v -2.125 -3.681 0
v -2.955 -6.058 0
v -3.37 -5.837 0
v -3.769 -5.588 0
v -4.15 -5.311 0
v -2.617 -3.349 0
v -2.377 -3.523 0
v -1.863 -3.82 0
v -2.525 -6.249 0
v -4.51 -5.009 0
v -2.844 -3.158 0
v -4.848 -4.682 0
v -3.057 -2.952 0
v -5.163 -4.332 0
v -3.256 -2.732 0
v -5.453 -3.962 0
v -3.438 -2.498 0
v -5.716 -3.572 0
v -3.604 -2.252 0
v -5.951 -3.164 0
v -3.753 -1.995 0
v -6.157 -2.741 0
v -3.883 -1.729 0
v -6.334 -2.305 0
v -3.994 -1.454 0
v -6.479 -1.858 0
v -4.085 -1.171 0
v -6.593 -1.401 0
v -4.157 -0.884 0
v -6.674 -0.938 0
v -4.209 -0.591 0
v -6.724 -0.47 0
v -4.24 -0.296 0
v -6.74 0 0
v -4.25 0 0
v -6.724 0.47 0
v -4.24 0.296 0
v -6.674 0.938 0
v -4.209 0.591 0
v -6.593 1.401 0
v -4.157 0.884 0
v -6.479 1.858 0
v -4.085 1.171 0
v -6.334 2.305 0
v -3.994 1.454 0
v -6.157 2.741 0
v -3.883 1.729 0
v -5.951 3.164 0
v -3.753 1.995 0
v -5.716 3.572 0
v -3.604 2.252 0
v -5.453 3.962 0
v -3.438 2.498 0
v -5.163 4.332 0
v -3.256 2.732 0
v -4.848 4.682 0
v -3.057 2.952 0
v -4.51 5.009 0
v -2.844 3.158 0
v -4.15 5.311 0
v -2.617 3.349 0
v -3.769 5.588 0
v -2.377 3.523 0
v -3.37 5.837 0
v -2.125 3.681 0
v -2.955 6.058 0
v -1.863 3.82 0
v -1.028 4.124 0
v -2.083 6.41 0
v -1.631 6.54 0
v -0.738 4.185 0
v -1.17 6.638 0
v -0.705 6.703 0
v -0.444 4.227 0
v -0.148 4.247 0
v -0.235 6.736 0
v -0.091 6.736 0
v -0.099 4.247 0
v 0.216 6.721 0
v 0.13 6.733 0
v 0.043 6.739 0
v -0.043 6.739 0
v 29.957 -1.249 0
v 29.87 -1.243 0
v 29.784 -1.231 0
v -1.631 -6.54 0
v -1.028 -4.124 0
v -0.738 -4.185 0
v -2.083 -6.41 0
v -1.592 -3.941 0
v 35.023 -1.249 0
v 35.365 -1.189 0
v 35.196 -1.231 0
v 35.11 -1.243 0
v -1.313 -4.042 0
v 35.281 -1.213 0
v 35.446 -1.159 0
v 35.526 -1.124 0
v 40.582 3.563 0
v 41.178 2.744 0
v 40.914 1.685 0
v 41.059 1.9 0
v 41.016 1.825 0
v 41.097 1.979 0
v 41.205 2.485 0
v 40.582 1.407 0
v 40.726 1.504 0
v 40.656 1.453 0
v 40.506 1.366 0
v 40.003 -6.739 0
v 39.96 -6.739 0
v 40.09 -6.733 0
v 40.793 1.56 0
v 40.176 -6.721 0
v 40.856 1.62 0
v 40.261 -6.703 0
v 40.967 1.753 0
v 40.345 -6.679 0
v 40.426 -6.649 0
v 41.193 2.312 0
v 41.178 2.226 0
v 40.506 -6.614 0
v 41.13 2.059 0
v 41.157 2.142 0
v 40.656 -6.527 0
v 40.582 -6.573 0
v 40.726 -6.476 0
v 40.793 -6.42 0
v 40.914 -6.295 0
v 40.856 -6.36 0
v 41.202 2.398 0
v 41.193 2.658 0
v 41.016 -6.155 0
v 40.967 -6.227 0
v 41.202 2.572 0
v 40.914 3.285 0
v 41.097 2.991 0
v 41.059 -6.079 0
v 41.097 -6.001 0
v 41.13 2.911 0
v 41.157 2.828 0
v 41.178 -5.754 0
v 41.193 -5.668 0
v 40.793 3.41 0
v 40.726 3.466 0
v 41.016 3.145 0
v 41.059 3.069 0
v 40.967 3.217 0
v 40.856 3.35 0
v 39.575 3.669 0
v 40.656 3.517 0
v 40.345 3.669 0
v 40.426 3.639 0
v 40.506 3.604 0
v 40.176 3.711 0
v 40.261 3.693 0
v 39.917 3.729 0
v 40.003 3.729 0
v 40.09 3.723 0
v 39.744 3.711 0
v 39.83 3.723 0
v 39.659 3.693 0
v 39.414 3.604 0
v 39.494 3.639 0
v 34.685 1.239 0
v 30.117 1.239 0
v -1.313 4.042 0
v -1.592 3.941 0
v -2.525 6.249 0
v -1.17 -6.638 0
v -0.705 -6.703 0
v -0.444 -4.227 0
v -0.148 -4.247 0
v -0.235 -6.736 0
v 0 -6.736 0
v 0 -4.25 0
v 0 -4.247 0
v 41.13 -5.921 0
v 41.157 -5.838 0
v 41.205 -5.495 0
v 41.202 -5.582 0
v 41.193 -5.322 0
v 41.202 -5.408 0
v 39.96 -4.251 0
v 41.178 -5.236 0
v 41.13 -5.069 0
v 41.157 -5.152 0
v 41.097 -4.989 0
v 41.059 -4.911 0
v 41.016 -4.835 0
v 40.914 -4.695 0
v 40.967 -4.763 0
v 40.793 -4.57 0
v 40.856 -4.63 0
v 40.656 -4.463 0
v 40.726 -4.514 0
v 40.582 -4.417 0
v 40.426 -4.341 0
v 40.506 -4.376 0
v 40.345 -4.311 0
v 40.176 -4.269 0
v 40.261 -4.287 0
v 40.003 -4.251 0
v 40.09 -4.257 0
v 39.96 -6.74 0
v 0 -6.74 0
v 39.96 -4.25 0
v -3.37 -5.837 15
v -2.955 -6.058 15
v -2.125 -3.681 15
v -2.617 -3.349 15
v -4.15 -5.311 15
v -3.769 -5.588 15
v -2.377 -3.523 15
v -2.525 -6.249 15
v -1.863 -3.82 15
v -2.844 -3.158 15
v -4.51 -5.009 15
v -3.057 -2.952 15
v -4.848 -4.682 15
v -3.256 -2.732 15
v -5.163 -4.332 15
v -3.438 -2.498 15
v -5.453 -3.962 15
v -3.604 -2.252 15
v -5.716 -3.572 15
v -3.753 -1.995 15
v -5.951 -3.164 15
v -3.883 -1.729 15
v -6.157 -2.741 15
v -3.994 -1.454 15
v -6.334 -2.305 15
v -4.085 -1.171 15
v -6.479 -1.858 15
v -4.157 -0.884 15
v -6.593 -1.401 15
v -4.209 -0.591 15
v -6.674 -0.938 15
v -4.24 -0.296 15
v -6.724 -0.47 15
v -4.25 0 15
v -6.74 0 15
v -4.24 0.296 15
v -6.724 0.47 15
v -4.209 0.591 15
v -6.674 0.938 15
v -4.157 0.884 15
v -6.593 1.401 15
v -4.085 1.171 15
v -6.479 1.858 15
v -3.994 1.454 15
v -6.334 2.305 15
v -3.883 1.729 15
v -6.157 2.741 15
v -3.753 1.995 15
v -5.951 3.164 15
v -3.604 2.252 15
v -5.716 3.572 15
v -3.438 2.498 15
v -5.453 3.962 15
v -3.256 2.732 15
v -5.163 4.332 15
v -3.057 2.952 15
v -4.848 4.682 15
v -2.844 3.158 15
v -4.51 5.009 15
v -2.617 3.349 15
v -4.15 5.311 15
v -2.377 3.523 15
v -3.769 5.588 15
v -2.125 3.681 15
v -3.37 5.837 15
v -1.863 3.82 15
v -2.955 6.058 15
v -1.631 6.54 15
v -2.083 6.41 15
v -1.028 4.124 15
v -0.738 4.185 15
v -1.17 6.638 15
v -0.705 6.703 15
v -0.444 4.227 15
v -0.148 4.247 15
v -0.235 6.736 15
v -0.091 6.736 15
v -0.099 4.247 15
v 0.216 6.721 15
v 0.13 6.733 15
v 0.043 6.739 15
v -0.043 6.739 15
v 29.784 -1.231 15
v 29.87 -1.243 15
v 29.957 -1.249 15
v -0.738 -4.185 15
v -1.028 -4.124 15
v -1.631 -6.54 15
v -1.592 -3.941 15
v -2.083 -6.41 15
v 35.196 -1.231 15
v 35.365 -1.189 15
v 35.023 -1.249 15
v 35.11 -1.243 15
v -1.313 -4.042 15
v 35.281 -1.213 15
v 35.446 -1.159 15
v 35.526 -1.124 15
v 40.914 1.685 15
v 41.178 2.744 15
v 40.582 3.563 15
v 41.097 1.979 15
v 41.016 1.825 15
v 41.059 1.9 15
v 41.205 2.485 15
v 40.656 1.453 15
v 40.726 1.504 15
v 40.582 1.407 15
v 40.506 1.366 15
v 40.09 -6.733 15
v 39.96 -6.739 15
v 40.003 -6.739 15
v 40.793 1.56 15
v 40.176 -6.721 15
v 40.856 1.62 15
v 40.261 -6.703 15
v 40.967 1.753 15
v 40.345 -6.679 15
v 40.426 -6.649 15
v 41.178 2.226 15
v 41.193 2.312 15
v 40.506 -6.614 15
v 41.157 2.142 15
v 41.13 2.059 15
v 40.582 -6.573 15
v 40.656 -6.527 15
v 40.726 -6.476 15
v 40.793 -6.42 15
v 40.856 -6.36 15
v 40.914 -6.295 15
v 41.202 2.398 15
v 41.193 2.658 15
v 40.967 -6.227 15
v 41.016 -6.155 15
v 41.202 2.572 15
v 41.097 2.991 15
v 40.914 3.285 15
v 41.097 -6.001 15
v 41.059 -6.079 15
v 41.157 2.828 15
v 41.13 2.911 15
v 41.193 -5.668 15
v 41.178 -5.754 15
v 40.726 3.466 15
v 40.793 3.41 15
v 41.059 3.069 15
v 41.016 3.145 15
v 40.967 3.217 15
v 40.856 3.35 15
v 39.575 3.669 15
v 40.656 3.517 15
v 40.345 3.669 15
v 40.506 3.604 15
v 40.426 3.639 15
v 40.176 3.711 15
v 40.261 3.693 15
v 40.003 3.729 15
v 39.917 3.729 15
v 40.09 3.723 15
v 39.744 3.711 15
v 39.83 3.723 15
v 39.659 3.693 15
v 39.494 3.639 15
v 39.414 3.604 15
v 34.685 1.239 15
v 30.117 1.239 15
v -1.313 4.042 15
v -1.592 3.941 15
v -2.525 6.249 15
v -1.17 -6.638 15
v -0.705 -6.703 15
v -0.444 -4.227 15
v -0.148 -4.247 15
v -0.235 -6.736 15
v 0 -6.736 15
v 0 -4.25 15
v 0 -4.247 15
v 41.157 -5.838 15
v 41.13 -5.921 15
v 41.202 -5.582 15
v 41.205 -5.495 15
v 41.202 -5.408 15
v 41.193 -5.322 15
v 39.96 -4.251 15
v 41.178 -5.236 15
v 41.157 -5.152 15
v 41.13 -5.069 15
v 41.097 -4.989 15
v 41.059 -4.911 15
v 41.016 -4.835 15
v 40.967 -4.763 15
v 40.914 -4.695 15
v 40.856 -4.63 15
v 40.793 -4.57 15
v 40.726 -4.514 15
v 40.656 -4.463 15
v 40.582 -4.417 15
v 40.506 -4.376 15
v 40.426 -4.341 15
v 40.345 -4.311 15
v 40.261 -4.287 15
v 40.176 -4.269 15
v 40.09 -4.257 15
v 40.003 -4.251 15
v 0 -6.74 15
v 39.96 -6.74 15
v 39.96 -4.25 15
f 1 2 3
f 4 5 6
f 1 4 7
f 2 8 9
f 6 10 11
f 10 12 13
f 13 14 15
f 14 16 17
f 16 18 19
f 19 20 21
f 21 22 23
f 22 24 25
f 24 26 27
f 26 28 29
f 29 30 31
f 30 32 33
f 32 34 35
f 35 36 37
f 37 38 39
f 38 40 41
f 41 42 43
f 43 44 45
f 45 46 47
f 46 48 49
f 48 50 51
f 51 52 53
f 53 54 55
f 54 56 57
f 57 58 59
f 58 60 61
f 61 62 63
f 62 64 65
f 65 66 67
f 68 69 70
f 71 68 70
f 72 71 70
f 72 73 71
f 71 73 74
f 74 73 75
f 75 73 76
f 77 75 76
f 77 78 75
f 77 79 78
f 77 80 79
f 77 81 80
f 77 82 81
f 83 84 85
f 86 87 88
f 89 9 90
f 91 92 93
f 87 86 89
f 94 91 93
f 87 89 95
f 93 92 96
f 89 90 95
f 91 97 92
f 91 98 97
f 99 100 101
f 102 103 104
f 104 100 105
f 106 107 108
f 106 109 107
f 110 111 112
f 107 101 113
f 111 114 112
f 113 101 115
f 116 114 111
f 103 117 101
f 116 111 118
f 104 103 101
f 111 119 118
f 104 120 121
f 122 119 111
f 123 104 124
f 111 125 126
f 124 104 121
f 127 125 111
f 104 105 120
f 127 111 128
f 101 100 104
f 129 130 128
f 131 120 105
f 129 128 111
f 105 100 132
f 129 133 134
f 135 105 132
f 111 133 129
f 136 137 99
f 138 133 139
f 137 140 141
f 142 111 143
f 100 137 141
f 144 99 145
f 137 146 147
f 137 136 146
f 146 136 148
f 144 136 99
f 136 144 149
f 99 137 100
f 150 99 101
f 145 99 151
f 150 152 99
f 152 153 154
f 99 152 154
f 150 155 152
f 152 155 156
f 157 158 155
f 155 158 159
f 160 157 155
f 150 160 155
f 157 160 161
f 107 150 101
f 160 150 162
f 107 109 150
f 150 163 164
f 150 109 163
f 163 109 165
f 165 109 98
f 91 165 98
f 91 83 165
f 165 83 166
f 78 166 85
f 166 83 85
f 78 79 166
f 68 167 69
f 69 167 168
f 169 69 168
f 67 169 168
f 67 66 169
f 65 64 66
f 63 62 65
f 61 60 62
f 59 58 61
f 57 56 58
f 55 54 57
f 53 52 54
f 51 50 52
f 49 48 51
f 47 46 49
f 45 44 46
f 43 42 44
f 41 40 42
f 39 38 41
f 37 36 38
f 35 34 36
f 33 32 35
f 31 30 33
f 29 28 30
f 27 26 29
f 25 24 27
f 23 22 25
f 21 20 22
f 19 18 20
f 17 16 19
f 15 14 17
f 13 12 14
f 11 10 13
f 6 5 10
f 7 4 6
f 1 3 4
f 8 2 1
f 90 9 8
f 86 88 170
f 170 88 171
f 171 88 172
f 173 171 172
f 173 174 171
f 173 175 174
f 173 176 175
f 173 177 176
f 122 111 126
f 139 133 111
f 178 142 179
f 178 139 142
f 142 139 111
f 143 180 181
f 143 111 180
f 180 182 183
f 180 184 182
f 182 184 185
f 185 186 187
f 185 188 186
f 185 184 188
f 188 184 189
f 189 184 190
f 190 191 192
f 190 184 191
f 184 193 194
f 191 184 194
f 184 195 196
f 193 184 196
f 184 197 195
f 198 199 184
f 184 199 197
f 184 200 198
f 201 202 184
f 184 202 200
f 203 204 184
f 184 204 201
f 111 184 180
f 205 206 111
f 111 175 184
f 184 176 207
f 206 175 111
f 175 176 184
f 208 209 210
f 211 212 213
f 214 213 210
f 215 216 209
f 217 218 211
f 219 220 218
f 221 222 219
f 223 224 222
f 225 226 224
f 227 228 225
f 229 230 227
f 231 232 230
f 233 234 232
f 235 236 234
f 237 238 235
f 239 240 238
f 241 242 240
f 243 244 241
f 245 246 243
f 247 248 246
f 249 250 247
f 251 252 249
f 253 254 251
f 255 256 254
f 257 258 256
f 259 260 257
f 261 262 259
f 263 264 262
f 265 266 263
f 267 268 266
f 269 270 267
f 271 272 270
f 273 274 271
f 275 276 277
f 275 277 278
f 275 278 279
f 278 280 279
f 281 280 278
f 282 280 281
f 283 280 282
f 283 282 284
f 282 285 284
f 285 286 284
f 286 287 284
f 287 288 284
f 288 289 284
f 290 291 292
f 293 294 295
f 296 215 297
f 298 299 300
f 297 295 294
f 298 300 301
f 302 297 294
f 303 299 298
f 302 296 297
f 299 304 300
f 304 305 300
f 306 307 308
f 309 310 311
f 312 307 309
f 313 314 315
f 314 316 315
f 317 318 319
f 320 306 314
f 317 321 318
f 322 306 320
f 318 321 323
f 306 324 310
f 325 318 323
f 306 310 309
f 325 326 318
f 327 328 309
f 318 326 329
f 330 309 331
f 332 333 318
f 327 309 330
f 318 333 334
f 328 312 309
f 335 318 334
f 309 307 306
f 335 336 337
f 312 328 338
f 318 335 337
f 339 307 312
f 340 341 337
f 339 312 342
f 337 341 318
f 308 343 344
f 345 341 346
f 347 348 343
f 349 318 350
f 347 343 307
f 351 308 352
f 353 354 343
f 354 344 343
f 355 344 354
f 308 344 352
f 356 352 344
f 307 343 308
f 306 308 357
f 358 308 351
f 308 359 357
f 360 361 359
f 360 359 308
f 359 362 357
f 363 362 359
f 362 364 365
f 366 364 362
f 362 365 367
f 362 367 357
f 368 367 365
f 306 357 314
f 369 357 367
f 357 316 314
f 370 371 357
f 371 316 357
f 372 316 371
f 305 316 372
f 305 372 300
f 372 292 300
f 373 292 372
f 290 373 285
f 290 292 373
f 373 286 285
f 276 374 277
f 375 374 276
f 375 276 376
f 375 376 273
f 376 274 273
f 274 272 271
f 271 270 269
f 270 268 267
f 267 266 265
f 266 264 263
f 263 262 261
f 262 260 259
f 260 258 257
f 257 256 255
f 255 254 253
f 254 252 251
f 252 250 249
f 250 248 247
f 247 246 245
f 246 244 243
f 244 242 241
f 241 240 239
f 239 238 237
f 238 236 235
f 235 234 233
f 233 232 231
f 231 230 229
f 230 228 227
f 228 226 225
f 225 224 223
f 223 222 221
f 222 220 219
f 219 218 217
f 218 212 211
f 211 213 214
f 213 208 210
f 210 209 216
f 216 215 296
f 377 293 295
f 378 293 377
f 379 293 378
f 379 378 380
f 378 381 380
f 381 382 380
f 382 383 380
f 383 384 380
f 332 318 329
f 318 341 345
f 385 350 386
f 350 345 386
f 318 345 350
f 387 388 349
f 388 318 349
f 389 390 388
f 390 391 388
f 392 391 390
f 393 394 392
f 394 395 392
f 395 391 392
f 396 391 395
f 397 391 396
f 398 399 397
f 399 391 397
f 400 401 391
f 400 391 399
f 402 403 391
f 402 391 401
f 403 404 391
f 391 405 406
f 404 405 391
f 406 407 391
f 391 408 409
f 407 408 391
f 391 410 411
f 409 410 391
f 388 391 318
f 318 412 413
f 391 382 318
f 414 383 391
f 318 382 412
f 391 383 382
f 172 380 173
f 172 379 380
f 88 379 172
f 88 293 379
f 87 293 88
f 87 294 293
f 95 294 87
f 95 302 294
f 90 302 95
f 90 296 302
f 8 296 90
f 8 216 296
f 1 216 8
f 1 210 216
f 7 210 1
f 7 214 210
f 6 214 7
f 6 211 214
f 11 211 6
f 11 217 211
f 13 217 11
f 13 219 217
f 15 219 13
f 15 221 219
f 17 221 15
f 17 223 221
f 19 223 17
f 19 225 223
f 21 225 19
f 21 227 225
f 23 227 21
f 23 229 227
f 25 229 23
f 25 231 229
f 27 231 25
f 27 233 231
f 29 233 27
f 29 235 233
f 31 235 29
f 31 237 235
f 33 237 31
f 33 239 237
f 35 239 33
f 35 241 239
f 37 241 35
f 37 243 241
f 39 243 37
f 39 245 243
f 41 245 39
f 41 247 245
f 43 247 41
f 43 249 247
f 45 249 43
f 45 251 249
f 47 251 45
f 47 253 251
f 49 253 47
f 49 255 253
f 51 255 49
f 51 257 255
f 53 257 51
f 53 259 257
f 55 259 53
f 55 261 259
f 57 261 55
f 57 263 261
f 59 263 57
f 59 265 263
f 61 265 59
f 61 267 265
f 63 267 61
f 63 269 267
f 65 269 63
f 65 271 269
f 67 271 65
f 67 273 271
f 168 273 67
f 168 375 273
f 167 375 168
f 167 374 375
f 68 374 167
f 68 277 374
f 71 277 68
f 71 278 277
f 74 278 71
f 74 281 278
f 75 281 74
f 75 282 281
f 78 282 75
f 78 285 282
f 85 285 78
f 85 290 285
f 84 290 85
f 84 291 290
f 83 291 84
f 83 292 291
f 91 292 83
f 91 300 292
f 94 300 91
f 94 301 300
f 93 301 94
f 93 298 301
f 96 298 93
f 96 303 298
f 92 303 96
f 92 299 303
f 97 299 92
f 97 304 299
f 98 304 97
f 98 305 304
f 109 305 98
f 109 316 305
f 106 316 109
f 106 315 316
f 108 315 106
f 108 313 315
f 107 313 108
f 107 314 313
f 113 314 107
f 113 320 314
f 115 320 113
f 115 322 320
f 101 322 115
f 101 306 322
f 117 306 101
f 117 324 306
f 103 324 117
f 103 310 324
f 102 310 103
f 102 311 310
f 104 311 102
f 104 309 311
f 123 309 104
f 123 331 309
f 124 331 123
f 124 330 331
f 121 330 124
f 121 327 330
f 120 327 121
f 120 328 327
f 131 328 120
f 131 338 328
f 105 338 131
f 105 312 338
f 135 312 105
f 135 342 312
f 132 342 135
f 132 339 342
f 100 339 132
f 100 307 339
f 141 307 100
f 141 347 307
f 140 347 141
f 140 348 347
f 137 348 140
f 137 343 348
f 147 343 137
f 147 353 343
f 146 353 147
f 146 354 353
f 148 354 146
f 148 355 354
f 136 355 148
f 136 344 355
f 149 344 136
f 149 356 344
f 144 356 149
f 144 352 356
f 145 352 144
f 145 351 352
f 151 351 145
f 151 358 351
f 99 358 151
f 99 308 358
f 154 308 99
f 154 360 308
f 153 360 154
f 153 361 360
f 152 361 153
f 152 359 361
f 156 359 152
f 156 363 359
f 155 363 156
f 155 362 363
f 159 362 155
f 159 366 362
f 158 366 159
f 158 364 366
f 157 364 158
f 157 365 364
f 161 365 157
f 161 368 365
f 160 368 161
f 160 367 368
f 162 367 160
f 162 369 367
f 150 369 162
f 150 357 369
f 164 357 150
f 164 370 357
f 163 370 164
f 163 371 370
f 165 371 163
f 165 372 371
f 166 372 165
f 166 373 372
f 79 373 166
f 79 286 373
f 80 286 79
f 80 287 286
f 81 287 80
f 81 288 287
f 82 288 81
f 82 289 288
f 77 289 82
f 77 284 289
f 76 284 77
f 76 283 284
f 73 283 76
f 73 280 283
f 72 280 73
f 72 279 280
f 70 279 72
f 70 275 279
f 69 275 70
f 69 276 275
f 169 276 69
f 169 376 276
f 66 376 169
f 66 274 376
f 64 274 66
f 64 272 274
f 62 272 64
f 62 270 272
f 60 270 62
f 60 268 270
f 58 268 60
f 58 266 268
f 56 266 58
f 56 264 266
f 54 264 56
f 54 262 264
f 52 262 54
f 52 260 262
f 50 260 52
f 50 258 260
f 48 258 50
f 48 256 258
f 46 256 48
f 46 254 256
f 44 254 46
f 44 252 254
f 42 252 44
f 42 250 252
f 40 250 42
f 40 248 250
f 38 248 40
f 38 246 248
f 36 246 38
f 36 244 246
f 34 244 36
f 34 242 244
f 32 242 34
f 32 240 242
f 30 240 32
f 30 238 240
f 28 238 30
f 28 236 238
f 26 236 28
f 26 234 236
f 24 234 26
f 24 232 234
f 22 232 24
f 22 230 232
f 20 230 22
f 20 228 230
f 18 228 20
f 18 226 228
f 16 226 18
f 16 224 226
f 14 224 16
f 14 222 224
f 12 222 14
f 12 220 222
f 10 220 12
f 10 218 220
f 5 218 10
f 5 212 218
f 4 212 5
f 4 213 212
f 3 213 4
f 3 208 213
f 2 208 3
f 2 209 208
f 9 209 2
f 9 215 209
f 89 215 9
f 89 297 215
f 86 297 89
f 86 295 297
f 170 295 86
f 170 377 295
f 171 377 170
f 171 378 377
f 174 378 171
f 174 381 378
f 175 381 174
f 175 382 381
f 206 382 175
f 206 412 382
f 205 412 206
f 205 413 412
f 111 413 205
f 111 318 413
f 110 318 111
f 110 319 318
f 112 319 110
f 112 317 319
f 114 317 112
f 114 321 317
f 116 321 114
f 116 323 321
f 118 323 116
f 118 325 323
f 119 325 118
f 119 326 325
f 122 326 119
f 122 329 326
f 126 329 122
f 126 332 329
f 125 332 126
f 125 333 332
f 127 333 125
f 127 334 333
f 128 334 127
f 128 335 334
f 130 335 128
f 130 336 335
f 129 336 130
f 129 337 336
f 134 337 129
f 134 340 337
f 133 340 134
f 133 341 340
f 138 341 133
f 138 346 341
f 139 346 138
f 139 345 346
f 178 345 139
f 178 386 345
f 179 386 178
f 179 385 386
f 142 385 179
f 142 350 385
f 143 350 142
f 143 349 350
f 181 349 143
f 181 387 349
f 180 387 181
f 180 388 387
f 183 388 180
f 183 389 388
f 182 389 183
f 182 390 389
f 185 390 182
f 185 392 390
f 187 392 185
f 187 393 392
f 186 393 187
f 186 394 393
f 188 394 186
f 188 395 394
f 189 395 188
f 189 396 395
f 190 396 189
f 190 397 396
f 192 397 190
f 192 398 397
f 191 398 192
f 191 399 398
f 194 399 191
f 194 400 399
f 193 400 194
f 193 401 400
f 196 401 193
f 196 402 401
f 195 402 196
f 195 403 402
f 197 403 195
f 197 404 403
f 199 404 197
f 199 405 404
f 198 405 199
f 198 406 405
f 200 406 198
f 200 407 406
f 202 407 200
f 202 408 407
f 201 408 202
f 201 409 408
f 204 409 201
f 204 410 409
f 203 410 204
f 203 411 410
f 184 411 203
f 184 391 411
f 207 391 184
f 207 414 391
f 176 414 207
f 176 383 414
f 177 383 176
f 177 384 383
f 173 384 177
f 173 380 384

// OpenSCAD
/*
 * Clip
 *
 * Author: Pavel Rampas
 * Version: 1.0.0 (Changelog is at the bottom)
 * License: CC BY-SA 4.0 [https://creativecommons.org/licenses/by-sa/4.0/]
 * Link: https://github.com/pavelrampas/openscad-models
 *
 * OpenSCAD version: 2021.01
 *
 * Instructions:
 * Set up parameters, render and print.
 *
 * Height is layer.
 * Thickness is perimeter.
 */

// Parameters
//------------------------------------------------------------------------------

$fn = $preview ? 15 : 90;

height = 15;
thickness = 2.49;
length = 30;

size = 8.5; // inner circle diameter
sizeSmall = 3; // space between top and bottom at the end

// Parameters that don't need to be changed
//------------------------------------------------------------------------------

// Code
//------------------------------------------------------------------------------

sizeWithThickness = size + (thickness * 2);

linear_extrude(height) {
    // circle
    difference() {
        circle(d = sizeWithThickness);
        circle(d = size);
        translate([0, -sizeWithThickness / 2, 0]) {
            square(sizeWithThickness);
        }
    }

    // bottom
    translate([0, -sizeWithThickness / 2, 0]) {
        square([length + (thickness * 4), thickness]);
    }
    translate([
        length + (thickness * 4),
        -(sizeWithThickness / 2) + (thickness / 2),
        0
    ]) {
        circle(d = thickness);
    }

    // top
    hull() {
        translate([0, size / 2 + thickness / 2, 0]) {
            circle(d = thickness);
        }
        translate([length, -(size / 2) + sizeSmall + (thickness / 2), 0]) {
            circle(d = thickness);
        }
    }

    hull() {
        translate([length, -(size / 2) + sizeSmall + (thickness / 2), 0]) {
            circle(d = thickness);
        }
        translate([
            length + (thickness * 2),
            -(size / 2) + sizeSmall + thickness / 2,
            0
        ]) {
            circle(d = thickness);
        }
    }

    hull() {
        translate([
            length + (thickness * 2),
            -(size / 2) + sizeSmall + thickness / 2,
            0
        ]) {
            circle(d = thickness);
        }
        translate([
            length + (thickness * 4),
            -(size / 2) + sizeSmall + (thickness / 2) + thickness,
            0
        ]) {
            circle(d = thickness);
        }
    }
}

// Functions
//------------------------------------------------------------------------------

// Modules
//------------------------------------------------------------------------------

// Changelog
//------------------------------------------------------------------------------

// [1.0.0]:
// Initial release.
